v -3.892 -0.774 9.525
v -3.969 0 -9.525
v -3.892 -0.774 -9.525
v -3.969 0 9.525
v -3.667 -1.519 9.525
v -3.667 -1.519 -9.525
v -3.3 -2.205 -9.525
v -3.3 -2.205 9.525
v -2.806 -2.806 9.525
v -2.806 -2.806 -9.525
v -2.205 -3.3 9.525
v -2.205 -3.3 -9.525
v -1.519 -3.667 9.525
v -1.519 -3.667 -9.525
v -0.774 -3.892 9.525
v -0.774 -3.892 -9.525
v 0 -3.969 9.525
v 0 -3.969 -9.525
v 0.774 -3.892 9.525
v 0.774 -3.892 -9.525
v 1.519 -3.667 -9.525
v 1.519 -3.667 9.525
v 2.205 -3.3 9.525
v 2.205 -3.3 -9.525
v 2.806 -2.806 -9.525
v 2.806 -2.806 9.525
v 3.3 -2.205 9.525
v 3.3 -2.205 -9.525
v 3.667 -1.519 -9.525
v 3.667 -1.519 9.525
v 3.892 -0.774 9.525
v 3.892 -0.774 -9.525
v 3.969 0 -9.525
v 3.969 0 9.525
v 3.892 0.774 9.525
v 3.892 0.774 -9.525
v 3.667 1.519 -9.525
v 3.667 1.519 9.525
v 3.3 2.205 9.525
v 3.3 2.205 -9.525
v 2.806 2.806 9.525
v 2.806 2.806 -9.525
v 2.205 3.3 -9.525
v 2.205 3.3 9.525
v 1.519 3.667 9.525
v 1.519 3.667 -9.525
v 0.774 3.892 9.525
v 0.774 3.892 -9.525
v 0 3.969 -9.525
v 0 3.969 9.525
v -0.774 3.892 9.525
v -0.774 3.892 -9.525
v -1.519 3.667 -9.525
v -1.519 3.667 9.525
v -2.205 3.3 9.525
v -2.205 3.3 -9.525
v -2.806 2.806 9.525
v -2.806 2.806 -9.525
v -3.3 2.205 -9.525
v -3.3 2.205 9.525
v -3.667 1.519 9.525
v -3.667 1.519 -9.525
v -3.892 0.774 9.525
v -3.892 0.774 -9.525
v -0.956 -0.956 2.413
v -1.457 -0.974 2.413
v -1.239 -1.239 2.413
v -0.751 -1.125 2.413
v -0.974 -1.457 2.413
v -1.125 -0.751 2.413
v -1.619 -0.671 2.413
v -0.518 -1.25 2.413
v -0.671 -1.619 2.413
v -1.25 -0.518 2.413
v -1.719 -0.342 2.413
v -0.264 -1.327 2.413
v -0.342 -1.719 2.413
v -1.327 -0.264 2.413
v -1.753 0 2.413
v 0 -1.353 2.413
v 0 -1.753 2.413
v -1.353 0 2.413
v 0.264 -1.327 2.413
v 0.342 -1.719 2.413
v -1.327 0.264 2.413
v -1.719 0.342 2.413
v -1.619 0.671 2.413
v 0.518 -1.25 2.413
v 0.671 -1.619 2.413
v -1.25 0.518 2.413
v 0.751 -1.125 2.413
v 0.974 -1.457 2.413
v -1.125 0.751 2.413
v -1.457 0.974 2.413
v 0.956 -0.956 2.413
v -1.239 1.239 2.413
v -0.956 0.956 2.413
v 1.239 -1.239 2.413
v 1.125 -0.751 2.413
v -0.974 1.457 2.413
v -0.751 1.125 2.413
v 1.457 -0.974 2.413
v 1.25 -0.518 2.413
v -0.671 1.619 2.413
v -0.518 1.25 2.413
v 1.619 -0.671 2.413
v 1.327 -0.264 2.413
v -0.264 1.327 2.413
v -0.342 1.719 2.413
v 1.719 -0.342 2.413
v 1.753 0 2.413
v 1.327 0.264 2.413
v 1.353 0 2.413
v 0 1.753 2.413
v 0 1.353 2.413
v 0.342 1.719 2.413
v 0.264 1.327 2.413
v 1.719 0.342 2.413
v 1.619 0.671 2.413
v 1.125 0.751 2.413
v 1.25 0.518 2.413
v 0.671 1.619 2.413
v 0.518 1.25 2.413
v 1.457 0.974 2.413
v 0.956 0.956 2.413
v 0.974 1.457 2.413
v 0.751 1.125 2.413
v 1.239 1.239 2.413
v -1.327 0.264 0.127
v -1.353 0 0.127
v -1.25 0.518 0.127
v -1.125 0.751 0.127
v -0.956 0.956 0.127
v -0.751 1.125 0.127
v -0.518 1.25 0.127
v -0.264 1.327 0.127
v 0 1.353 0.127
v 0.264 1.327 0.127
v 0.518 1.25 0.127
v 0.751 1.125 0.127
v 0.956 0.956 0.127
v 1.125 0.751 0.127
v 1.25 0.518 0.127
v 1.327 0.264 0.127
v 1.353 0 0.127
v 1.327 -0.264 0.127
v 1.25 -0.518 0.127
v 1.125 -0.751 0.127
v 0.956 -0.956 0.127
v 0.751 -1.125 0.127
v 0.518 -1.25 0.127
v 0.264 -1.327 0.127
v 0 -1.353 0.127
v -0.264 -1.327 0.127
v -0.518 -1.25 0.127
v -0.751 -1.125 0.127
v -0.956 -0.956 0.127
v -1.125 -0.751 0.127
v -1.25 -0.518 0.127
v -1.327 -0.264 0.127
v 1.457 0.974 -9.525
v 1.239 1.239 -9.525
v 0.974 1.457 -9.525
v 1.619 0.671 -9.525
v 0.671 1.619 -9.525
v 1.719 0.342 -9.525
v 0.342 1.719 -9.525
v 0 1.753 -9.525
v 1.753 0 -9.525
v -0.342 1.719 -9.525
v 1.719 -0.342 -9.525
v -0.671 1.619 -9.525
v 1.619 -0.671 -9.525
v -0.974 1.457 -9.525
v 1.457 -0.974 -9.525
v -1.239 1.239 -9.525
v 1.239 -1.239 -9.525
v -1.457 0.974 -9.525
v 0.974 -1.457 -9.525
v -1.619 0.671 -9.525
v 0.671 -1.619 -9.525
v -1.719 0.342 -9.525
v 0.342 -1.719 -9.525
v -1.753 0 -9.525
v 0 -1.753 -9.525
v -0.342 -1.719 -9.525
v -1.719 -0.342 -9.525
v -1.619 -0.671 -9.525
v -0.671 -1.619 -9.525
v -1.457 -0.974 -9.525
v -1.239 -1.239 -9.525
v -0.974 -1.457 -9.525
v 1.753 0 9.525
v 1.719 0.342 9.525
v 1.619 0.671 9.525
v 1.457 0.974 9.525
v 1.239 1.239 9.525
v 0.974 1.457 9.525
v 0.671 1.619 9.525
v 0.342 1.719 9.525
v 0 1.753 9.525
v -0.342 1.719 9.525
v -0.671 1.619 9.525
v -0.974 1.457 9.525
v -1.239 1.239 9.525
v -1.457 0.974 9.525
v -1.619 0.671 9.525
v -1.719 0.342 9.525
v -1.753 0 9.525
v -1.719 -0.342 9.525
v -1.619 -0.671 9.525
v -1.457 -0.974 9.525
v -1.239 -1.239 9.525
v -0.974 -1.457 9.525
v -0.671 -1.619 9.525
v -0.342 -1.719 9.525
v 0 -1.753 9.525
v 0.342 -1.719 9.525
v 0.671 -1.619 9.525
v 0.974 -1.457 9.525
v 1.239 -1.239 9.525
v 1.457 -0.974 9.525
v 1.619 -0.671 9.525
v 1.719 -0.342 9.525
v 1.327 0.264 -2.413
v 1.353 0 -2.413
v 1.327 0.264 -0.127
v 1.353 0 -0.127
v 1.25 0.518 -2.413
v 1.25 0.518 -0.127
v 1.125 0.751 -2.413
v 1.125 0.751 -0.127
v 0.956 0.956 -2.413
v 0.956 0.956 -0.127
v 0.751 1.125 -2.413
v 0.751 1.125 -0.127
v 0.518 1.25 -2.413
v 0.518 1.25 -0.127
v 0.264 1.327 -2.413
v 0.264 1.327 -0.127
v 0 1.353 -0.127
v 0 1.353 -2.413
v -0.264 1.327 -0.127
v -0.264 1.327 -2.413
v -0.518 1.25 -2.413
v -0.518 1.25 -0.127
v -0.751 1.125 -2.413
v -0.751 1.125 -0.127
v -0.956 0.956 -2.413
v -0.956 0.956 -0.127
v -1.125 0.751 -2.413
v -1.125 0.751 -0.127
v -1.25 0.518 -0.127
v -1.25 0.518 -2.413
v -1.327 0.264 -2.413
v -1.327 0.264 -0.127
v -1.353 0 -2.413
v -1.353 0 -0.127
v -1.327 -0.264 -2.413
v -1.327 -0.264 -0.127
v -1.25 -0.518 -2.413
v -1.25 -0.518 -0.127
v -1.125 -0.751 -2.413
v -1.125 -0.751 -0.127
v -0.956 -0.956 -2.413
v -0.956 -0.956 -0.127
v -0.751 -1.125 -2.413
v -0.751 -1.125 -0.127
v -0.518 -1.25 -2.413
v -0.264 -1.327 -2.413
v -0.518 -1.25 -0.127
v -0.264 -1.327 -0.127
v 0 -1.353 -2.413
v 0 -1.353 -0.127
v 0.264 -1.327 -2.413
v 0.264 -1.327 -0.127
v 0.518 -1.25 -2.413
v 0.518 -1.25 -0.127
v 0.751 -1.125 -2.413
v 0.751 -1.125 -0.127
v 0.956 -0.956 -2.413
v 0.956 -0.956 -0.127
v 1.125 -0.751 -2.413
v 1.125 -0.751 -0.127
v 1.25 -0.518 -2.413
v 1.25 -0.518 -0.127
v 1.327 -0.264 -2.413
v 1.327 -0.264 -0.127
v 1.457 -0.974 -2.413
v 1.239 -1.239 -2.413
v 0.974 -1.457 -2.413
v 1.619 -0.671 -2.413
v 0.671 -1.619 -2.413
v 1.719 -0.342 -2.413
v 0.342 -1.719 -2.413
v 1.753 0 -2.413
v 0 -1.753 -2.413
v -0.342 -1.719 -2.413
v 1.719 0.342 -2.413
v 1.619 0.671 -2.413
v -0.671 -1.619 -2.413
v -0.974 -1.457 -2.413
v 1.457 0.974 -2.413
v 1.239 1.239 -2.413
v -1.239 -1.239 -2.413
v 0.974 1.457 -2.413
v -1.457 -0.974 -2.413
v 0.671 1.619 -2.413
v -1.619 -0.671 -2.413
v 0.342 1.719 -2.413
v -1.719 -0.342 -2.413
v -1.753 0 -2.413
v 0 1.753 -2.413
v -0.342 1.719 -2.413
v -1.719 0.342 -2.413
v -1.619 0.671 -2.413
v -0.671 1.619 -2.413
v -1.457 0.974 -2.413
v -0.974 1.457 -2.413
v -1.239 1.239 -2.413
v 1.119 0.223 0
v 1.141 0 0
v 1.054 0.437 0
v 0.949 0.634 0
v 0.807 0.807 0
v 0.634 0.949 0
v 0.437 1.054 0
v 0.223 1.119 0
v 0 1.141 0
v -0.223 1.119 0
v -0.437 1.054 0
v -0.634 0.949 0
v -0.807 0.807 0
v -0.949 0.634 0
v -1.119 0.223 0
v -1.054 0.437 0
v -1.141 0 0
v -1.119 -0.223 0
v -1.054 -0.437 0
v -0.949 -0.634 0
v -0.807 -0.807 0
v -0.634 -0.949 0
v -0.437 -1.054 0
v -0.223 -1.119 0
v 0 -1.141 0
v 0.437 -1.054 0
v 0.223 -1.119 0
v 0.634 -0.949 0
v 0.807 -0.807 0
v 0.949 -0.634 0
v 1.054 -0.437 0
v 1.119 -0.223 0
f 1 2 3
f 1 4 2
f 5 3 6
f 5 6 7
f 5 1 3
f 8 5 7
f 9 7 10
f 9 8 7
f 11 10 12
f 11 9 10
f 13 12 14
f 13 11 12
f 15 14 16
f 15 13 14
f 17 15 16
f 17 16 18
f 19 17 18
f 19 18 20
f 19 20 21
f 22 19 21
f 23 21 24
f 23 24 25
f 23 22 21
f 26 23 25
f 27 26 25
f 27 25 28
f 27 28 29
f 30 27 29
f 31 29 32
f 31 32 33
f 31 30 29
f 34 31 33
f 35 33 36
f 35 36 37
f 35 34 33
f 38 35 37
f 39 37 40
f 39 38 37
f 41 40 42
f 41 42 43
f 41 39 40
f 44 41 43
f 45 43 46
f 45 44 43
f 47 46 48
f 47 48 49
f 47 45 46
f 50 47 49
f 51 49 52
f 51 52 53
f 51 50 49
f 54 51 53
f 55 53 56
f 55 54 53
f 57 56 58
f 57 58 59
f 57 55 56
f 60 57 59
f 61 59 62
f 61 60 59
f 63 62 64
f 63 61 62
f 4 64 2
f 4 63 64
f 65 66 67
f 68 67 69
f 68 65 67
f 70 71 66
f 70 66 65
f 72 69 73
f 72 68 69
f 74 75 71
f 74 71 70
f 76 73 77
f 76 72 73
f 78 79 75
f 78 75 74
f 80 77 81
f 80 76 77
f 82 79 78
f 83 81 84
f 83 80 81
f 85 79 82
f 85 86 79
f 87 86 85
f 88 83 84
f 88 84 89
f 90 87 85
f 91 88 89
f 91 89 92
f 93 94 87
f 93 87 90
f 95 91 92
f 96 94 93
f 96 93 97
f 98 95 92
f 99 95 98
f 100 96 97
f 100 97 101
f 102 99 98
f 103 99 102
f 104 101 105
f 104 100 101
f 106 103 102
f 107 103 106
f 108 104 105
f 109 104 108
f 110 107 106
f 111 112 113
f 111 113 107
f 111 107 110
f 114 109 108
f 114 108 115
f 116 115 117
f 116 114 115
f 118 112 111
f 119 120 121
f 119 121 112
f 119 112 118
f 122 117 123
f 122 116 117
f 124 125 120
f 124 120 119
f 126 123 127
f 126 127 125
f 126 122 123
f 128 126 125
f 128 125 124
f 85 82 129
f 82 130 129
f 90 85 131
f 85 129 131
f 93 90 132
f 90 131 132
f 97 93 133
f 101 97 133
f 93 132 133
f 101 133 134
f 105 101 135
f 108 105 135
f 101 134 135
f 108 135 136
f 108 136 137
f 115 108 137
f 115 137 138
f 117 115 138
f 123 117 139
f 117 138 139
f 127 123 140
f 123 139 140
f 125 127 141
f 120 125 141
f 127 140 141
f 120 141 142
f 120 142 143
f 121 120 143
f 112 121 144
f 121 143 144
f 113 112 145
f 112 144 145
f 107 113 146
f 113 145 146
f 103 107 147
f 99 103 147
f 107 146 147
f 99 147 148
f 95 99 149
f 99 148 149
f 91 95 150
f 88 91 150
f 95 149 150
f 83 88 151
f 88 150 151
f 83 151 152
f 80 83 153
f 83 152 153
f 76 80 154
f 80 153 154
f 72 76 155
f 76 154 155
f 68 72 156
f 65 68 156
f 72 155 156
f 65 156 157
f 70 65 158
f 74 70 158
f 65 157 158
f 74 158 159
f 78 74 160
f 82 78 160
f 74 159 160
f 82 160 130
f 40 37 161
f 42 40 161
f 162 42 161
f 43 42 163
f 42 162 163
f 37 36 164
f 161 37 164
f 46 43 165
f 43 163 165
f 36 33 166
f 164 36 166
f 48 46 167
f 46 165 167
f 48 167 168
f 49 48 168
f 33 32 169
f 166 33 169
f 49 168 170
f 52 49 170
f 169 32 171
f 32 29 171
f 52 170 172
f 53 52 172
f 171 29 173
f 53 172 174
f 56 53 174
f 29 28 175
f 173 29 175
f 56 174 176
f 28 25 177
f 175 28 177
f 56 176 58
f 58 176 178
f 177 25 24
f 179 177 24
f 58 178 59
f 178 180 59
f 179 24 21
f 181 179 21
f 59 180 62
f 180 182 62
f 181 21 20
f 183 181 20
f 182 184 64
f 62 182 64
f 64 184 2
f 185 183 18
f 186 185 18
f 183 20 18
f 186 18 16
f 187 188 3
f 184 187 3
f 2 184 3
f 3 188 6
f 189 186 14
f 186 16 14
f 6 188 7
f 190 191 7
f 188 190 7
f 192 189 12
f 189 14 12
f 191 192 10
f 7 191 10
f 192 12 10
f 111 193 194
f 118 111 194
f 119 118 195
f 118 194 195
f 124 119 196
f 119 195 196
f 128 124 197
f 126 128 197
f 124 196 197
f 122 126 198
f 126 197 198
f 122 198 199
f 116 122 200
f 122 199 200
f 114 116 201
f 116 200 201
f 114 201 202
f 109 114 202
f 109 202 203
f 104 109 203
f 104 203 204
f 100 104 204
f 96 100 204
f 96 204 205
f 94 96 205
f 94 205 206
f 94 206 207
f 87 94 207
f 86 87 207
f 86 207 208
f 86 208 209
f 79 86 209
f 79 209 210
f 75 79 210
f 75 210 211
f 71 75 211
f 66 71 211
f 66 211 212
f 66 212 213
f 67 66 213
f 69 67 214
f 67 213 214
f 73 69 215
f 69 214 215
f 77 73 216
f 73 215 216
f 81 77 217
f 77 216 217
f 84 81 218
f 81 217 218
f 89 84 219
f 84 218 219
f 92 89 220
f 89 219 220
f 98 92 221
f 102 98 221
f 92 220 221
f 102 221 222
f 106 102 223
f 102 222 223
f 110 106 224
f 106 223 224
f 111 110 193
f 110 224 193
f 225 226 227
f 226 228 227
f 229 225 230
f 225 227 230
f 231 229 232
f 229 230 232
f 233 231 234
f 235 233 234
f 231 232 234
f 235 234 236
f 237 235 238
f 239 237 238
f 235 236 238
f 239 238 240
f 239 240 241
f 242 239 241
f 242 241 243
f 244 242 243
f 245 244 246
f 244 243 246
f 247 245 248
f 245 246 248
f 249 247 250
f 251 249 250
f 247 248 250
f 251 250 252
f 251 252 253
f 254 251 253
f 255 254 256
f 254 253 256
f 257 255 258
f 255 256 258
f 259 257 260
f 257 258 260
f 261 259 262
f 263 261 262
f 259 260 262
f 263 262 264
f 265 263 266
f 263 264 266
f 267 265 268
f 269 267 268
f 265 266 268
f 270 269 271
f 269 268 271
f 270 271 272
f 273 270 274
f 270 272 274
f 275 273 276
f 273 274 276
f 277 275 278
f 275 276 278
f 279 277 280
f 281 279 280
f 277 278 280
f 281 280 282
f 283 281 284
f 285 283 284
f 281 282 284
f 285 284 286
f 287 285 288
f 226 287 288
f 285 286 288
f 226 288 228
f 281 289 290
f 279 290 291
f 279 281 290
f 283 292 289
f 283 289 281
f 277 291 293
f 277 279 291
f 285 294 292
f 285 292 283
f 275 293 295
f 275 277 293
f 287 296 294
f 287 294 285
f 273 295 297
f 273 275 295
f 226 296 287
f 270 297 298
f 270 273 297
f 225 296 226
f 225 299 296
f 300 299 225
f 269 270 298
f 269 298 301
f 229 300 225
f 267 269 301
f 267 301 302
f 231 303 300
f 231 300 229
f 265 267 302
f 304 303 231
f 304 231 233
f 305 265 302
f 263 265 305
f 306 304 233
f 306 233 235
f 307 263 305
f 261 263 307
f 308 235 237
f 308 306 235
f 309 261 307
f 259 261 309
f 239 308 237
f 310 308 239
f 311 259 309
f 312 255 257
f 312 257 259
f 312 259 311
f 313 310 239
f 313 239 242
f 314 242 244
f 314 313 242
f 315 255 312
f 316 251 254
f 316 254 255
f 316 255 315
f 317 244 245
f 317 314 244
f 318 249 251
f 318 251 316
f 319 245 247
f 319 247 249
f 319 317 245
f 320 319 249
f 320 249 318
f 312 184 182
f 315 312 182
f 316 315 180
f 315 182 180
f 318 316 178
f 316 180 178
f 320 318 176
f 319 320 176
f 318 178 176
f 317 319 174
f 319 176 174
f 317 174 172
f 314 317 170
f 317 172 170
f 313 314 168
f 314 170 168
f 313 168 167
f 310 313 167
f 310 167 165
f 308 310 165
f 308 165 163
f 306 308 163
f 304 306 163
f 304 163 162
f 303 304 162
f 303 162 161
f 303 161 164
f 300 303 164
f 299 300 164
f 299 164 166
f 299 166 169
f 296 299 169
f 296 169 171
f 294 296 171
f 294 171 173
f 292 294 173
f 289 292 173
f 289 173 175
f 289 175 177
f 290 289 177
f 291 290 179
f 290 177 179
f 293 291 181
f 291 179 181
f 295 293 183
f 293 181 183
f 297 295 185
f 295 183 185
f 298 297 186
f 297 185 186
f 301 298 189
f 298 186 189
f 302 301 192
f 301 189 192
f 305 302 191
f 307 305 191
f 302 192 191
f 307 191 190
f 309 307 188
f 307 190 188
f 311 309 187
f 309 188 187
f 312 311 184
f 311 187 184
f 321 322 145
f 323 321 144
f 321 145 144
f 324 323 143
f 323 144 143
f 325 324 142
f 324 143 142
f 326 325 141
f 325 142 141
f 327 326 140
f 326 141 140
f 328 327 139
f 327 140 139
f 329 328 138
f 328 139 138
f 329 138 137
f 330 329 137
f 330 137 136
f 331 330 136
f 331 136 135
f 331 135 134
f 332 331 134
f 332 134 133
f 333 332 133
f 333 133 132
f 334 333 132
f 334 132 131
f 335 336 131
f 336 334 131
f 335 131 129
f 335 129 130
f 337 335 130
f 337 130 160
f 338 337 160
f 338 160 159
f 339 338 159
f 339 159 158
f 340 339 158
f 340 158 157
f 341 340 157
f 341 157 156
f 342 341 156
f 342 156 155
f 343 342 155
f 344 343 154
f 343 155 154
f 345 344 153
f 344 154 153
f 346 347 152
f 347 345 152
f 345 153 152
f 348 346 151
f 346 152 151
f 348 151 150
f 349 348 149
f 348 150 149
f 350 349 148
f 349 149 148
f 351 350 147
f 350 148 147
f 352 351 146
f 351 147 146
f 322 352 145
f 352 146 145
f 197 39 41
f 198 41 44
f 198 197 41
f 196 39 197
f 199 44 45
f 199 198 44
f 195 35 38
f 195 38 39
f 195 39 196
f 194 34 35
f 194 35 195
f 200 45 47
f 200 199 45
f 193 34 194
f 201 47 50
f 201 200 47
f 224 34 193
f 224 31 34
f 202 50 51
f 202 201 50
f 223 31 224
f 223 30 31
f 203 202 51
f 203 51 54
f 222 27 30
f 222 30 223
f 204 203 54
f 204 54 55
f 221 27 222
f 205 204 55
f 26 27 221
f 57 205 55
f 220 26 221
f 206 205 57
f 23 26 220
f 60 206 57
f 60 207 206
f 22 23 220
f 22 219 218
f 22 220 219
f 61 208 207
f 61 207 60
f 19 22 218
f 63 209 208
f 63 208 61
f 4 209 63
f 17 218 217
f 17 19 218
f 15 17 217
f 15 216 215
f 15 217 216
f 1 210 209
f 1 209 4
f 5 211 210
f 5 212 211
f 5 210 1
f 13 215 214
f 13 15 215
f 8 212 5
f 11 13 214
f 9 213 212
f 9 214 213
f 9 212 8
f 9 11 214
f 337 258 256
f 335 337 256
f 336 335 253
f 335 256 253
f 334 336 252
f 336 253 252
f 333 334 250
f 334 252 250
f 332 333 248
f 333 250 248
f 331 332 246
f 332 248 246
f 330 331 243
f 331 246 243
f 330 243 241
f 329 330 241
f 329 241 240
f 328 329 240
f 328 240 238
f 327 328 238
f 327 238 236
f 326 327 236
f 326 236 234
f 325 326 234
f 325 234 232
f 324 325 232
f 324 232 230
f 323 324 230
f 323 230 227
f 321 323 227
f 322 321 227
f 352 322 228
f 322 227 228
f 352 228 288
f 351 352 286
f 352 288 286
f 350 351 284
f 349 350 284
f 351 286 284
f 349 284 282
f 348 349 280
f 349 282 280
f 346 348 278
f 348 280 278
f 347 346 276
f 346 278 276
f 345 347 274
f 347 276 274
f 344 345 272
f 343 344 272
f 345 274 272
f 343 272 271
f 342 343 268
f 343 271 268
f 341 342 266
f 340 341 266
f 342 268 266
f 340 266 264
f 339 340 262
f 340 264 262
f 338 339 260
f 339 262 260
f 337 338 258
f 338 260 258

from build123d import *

# Parameters (mm, degrees)
SKETCH1_R                       = 3.96875
BOSS_EXTRUDE1_DEPTH             = 9.525
F_6_32_TAPPED_HOLE1_D           = 2.7051
F_6_32_TAPPED_HOLE1_DEPTH       = 9.398
F_6_32_TAPPED_HOLE1_CBORE_D     = 3.5052
F_6_32_TAPPED_HOLE1_CBORE_DEPTH = 7.112
F_6_32_TAPPED_HOLE1_TIP         = 0.81269403
F_6_32_TAPPED_HOLE2_D           = 2.7051
F_6_32_TAPPED_HOLE2_DEPTH       = 9.398
F_6_32_TAPPED_HOLE2_CBORE_D     = 3.5052
F_6_32_TAPPED_HOLE2_CBORE_DEPTH = 7.112
F_6_32_TAPPED_HOLE2_TIP         = 0.81269403


with BuildPart() as part:
    # Sketch1 → Boss-Extrude1 (new, symmetric)
    with BuildSketch(Plane.XY):
        with Locations(Location((0, 0, 0), (0, 0, 180))):
            Circle(SKETCH1_R)
    extrude(amount=BOSS_EXTRUDE1_DEPTH, both=True)

    # #6-32 Tapped Hole1
    with Locations(Plane(origin=(0, 0, -9.525), x_dir=(-1, 0, 0), z_dir=(0, 0, -1))):
        with Locations((0, 0)):
            CounterBoreHole(F_6_32_TAPPED_HOLE1_D / 2, F_6_32_TAPPED_HOLE1_CBORE_D / 2, F_6_32_TAPPED_HOLE1_CBORE_DEPTH, depth=F_6_32_TAPPED_HOLE1_DEPTH)
            with Locations((0, 0, -(F_6_32_TAPPED_HOLE1_DEPTH + F_6_32_TAPPED_HOLE1_TIP / 2))):  # 118° drill point
                Cone(0, F_6_32_TAPPED_HOLE1_D / 2, F_6_32_TAPPED_HOLE1_TIP, mode=Mode.SUBTRACT)

    # #6-32 Tapped Hole2
    with Locations(Plane.XY.offset(9.525)):
        with Locations((0, 0)):
            CounterBoreHole(F_6_32_TAPPED_HOLE2_D / 2, F_6_32_TAPPED_HOLE2_CBORE_D / 2, F_6_32_TAPPED_HOLE2_CBORE_DEPTH, depth=F_6_32_TAPPED_HOLE2_DEPTH)
            with Locations((0, 0, -(F_6_32_TAPPED_HOLE2_DEPTH + F_6_32_TAPPED_HOLE2_TIP / 2))):  # 118° drill point
                Cone(0, F_6_32_TAPPED_HOLE2_D / 2, F_6_32_TAPPED_HOLE2_TIP, mode=Mode.SUBTRACT)


solid = part.part
